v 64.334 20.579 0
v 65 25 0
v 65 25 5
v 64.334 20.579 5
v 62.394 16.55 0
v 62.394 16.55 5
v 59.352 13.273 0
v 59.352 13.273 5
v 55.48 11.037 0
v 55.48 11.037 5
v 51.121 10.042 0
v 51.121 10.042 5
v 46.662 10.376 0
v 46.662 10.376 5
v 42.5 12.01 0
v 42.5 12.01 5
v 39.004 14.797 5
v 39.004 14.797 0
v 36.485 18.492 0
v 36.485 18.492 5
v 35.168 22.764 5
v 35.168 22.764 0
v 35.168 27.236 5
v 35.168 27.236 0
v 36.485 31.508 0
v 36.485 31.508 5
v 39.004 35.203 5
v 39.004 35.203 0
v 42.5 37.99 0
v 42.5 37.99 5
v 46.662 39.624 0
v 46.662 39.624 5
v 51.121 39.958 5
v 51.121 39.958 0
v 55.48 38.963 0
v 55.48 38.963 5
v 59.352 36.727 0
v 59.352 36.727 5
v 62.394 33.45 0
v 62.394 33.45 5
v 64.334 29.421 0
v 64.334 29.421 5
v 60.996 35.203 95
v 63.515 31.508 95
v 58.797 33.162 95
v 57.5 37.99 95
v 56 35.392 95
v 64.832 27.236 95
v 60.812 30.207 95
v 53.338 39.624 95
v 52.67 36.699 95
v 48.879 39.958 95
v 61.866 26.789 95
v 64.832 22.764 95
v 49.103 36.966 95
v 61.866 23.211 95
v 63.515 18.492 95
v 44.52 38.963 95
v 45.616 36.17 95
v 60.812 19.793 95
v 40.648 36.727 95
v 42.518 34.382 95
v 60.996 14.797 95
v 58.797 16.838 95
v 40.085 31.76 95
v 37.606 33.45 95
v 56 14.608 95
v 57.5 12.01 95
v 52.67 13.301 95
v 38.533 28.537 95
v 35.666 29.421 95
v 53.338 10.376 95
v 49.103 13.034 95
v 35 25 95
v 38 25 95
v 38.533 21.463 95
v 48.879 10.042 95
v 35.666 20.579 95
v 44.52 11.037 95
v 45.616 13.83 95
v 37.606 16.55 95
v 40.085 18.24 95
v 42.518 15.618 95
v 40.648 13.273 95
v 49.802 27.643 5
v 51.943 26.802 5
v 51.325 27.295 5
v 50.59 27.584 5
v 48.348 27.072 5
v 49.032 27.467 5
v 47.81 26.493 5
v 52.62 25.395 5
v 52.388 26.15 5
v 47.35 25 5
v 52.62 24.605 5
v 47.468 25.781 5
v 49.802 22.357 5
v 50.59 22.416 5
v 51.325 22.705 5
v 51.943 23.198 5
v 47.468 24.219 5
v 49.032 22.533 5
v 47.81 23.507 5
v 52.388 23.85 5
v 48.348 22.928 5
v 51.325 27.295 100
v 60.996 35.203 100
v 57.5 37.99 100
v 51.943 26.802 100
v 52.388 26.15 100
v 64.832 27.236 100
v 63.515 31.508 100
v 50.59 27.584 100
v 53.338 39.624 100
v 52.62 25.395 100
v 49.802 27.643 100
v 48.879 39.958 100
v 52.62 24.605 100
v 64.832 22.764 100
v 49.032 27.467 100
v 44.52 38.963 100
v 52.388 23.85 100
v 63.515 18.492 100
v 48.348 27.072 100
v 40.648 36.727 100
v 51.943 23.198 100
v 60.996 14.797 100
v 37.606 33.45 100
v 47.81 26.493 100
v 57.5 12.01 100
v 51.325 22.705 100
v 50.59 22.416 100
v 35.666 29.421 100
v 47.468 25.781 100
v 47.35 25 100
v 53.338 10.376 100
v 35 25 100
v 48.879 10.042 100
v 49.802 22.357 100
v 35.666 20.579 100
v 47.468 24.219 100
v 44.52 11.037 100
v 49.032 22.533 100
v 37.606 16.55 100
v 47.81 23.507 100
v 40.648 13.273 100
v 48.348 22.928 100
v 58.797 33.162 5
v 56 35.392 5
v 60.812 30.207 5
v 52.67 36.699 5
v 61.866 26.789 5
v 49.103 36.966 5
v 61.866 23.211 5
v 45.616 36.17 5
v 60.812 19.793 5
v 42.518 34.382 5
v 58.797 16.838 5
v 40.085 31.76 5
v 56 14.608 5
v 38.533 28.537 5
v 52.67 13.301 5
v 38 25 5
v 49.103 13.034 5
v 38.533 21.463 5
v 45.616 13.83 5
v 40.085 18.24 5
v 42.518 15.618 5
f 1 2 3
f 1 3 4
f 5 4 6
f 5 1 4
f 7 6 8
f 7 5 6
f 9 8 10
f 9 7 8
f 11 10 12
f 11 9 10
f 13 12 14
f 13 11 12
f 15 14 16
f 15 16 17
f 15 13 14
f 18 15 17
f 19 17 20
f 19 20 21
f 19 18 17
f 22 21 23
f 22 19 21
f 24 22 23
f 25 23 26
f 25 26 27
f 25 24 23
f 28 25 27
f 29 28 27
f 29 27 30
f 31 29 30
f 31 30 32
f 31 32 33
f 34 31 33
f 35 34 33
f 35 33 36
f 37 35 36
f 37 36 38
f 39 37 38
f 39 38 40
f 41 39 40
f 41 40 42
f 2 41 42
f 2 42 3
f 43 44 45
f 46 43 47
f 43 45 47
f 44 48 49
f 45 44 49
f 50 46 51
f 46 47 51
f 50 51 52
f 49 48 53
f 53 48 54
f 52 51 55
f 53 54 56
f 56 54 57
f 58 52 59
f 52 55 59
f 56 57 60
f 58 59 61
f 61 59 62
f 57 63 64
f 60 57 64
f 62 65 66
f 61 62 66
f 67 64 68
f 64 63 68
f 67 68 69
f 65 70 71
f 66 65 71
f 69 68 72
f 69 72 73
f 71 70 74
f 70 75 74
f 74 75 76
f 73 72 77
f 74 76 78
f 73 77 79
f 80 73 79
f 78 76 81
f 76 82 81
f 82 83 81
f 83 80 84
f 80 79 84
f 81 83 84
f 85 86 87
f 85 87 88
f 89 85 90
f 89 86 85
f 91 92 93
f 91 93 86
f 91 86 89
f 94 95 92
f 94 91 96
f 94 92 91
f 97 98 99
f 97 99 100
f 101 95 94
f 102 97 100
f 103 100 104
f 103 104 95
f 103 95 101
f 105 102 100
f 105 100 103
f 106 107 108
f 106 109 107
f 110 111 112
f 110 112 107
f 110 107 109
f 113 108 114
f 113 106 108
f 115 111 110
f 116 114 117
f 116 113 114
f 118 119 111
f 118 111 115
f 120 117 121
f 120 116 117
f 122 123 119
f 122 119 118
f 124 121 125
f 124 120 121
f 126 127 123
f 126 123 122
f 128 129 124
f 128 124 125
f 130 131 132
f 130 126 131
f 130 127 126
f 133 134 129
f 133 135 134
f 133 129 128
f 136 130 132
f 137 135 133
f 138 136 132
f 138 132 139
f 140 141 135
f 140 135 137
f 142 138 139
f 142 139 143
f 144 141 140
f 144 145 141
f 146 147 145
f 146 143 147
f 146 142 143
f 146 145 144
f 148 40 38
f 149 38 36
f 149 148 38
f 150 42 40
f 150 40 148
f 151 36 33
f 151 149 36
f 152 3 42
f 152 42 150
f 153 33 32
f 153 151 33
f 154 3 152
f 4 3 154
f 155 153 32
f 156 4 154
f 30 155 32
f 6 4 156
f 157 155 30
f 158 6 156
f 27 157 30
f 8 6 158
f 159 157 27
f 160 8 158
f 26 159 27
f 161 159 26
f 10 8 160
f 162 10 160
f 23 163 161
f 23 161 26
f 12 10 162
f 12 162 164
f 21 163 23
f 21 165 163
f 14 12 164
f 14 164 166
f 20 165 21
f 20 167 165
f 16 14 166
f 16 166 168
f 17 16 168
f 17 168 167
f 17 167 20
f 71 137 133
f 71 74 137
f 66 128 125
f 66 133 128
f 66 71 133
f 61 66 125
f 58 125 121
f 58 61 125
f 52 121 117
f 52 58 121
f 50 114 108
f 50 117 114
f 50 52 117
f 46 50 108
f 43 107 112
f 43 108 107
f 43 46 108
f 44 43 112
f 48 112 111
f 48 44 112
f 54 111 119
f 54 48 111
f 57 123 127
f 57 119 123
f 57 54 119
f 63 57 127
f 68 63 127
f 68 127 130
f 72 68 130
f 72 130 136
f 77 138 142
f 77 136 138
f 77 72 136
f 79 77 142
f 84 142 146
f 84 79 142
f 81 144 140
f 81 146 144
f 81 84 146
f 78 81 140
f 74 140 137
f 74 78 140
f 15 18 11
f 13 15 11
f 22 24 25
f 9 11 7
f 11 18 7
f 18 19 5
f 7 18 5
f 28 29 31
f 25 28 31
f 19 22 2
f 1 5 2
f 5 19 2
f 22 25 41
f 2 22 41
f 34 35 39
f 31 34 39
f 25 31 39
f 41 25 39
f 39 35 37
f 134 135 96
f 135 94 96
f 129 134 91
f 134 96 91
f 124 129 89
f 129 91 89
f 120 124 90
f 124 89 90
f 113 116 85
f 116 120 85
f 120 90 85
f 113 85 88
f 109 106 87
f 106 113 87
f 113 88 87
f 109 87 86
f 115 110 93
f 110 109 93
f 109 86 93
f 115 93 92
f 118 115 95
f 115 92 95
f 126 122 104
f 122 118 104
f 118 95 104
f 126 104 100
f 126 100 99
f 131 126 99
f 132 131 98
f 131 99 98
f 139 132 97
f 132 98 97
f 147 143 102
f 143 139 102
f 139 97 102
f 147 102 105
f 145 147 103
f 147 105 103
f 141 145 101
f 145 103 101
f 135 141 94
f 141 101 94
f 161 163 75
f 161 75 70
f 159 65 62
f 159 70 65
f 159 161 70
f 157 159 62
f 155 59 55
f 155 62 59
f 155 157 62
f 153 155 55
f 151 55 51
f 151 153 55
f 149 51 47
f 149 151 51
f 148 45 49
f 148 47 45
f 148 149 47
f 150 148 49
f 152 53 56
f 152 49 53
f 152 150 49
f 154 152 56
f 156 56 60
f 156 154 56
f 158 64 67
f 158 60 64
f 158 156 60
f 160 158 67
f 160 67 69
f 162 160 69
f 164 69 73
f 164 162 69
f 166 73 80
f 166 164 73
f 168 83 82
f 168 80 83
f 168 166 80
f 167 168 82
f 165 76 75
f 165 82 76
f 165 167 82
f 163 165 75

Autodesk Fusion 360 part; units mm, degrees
sketch "Sketch1" plane through (0, 0, 0) normal (0, 0, 1) x (1, 0, 0)
  circle A0 centre (50, 25) radius 15
  dimension "d1" = 30
extrude "Extrude1" add sketch "Sketch1" along normal blind 60
sketch "Sketch2" plane through (0, 0, 60) normal (0, 0, 1) x (-1, 0, 0)
  circle A0 centre (-50, -25) radius 15
  circle A1 centre (-50, -25) radius 2.5
  dimension "d4" = 5
extrude "Extrude2" cut sketch "Sketch2" against normal blind 55 contours A1
sketch "Sketch3" plane through (0, 0, 60) normal (0, 0, 1) x (-1, 0, 0)
  circle A0 centre (-50, -25) radius 2.5
  circle A1 centre (-50, -25) radius 15
  circle A2 centre (-50, -25) radius 12
  dimension "d7" = 24
extrude "Extrude3" cut sketch "Sketch3" against normal blind 55 contours A1
sketch "Sketch4" plane through (0, 0, 60) normal (0, 0, 1) x (-1, 0, 0)
  circle A0 centre (-50, -25) radius 12
  circle A1 centre (-50, -25) radius 2.5
  circle A2 centre (-50, -25) radius 15
  dimension "d10" = 30
extrude "Extrude4" add sketch "Sketch4" against normal blind 5 contours A2
extrude "Extrude5" cut 1 faces at (63.9442, 25.7452, 5) along direction (0, 0, 1) blind 55
extrude "Extrude6" add 1 faces at (41.2207, 25.7204, 60) along direction (0, 0, -1) blind 55
extrude "Extrude7" add 1 faces at (41.2207, 25.7204, 60) along direction (0, 0, 1) blind 35
sketch "Sketch5" plane through (0, 0, 95) normal (0, 0, 1) x (-1, 0, 0)
  circle A0 centre (-50, -25) radius 12
  circle A1 centre (-50, -25) radius 2.5
  circle A2 centre (-50, -25) radius 2.65
  dimension "d19" = 5.3
extrude "Extrude8" cut sketch "Sketch5" against normal blind 90 contours A2
sketch "Sketch6" plane through (0, 0, 95) normal (0, 0, 1) x (-1, 0, 0)
  circle A0 centre (-50, -25) radius 2.65
  circle A1 centre (-50, -25) radius 12
  circle A2 centre (-50, -25) radius 15
  dimension "d22" = 30
extrude "Extrude9" add sketch "Sketch6" along normal blind 5 contours A1 | A2
